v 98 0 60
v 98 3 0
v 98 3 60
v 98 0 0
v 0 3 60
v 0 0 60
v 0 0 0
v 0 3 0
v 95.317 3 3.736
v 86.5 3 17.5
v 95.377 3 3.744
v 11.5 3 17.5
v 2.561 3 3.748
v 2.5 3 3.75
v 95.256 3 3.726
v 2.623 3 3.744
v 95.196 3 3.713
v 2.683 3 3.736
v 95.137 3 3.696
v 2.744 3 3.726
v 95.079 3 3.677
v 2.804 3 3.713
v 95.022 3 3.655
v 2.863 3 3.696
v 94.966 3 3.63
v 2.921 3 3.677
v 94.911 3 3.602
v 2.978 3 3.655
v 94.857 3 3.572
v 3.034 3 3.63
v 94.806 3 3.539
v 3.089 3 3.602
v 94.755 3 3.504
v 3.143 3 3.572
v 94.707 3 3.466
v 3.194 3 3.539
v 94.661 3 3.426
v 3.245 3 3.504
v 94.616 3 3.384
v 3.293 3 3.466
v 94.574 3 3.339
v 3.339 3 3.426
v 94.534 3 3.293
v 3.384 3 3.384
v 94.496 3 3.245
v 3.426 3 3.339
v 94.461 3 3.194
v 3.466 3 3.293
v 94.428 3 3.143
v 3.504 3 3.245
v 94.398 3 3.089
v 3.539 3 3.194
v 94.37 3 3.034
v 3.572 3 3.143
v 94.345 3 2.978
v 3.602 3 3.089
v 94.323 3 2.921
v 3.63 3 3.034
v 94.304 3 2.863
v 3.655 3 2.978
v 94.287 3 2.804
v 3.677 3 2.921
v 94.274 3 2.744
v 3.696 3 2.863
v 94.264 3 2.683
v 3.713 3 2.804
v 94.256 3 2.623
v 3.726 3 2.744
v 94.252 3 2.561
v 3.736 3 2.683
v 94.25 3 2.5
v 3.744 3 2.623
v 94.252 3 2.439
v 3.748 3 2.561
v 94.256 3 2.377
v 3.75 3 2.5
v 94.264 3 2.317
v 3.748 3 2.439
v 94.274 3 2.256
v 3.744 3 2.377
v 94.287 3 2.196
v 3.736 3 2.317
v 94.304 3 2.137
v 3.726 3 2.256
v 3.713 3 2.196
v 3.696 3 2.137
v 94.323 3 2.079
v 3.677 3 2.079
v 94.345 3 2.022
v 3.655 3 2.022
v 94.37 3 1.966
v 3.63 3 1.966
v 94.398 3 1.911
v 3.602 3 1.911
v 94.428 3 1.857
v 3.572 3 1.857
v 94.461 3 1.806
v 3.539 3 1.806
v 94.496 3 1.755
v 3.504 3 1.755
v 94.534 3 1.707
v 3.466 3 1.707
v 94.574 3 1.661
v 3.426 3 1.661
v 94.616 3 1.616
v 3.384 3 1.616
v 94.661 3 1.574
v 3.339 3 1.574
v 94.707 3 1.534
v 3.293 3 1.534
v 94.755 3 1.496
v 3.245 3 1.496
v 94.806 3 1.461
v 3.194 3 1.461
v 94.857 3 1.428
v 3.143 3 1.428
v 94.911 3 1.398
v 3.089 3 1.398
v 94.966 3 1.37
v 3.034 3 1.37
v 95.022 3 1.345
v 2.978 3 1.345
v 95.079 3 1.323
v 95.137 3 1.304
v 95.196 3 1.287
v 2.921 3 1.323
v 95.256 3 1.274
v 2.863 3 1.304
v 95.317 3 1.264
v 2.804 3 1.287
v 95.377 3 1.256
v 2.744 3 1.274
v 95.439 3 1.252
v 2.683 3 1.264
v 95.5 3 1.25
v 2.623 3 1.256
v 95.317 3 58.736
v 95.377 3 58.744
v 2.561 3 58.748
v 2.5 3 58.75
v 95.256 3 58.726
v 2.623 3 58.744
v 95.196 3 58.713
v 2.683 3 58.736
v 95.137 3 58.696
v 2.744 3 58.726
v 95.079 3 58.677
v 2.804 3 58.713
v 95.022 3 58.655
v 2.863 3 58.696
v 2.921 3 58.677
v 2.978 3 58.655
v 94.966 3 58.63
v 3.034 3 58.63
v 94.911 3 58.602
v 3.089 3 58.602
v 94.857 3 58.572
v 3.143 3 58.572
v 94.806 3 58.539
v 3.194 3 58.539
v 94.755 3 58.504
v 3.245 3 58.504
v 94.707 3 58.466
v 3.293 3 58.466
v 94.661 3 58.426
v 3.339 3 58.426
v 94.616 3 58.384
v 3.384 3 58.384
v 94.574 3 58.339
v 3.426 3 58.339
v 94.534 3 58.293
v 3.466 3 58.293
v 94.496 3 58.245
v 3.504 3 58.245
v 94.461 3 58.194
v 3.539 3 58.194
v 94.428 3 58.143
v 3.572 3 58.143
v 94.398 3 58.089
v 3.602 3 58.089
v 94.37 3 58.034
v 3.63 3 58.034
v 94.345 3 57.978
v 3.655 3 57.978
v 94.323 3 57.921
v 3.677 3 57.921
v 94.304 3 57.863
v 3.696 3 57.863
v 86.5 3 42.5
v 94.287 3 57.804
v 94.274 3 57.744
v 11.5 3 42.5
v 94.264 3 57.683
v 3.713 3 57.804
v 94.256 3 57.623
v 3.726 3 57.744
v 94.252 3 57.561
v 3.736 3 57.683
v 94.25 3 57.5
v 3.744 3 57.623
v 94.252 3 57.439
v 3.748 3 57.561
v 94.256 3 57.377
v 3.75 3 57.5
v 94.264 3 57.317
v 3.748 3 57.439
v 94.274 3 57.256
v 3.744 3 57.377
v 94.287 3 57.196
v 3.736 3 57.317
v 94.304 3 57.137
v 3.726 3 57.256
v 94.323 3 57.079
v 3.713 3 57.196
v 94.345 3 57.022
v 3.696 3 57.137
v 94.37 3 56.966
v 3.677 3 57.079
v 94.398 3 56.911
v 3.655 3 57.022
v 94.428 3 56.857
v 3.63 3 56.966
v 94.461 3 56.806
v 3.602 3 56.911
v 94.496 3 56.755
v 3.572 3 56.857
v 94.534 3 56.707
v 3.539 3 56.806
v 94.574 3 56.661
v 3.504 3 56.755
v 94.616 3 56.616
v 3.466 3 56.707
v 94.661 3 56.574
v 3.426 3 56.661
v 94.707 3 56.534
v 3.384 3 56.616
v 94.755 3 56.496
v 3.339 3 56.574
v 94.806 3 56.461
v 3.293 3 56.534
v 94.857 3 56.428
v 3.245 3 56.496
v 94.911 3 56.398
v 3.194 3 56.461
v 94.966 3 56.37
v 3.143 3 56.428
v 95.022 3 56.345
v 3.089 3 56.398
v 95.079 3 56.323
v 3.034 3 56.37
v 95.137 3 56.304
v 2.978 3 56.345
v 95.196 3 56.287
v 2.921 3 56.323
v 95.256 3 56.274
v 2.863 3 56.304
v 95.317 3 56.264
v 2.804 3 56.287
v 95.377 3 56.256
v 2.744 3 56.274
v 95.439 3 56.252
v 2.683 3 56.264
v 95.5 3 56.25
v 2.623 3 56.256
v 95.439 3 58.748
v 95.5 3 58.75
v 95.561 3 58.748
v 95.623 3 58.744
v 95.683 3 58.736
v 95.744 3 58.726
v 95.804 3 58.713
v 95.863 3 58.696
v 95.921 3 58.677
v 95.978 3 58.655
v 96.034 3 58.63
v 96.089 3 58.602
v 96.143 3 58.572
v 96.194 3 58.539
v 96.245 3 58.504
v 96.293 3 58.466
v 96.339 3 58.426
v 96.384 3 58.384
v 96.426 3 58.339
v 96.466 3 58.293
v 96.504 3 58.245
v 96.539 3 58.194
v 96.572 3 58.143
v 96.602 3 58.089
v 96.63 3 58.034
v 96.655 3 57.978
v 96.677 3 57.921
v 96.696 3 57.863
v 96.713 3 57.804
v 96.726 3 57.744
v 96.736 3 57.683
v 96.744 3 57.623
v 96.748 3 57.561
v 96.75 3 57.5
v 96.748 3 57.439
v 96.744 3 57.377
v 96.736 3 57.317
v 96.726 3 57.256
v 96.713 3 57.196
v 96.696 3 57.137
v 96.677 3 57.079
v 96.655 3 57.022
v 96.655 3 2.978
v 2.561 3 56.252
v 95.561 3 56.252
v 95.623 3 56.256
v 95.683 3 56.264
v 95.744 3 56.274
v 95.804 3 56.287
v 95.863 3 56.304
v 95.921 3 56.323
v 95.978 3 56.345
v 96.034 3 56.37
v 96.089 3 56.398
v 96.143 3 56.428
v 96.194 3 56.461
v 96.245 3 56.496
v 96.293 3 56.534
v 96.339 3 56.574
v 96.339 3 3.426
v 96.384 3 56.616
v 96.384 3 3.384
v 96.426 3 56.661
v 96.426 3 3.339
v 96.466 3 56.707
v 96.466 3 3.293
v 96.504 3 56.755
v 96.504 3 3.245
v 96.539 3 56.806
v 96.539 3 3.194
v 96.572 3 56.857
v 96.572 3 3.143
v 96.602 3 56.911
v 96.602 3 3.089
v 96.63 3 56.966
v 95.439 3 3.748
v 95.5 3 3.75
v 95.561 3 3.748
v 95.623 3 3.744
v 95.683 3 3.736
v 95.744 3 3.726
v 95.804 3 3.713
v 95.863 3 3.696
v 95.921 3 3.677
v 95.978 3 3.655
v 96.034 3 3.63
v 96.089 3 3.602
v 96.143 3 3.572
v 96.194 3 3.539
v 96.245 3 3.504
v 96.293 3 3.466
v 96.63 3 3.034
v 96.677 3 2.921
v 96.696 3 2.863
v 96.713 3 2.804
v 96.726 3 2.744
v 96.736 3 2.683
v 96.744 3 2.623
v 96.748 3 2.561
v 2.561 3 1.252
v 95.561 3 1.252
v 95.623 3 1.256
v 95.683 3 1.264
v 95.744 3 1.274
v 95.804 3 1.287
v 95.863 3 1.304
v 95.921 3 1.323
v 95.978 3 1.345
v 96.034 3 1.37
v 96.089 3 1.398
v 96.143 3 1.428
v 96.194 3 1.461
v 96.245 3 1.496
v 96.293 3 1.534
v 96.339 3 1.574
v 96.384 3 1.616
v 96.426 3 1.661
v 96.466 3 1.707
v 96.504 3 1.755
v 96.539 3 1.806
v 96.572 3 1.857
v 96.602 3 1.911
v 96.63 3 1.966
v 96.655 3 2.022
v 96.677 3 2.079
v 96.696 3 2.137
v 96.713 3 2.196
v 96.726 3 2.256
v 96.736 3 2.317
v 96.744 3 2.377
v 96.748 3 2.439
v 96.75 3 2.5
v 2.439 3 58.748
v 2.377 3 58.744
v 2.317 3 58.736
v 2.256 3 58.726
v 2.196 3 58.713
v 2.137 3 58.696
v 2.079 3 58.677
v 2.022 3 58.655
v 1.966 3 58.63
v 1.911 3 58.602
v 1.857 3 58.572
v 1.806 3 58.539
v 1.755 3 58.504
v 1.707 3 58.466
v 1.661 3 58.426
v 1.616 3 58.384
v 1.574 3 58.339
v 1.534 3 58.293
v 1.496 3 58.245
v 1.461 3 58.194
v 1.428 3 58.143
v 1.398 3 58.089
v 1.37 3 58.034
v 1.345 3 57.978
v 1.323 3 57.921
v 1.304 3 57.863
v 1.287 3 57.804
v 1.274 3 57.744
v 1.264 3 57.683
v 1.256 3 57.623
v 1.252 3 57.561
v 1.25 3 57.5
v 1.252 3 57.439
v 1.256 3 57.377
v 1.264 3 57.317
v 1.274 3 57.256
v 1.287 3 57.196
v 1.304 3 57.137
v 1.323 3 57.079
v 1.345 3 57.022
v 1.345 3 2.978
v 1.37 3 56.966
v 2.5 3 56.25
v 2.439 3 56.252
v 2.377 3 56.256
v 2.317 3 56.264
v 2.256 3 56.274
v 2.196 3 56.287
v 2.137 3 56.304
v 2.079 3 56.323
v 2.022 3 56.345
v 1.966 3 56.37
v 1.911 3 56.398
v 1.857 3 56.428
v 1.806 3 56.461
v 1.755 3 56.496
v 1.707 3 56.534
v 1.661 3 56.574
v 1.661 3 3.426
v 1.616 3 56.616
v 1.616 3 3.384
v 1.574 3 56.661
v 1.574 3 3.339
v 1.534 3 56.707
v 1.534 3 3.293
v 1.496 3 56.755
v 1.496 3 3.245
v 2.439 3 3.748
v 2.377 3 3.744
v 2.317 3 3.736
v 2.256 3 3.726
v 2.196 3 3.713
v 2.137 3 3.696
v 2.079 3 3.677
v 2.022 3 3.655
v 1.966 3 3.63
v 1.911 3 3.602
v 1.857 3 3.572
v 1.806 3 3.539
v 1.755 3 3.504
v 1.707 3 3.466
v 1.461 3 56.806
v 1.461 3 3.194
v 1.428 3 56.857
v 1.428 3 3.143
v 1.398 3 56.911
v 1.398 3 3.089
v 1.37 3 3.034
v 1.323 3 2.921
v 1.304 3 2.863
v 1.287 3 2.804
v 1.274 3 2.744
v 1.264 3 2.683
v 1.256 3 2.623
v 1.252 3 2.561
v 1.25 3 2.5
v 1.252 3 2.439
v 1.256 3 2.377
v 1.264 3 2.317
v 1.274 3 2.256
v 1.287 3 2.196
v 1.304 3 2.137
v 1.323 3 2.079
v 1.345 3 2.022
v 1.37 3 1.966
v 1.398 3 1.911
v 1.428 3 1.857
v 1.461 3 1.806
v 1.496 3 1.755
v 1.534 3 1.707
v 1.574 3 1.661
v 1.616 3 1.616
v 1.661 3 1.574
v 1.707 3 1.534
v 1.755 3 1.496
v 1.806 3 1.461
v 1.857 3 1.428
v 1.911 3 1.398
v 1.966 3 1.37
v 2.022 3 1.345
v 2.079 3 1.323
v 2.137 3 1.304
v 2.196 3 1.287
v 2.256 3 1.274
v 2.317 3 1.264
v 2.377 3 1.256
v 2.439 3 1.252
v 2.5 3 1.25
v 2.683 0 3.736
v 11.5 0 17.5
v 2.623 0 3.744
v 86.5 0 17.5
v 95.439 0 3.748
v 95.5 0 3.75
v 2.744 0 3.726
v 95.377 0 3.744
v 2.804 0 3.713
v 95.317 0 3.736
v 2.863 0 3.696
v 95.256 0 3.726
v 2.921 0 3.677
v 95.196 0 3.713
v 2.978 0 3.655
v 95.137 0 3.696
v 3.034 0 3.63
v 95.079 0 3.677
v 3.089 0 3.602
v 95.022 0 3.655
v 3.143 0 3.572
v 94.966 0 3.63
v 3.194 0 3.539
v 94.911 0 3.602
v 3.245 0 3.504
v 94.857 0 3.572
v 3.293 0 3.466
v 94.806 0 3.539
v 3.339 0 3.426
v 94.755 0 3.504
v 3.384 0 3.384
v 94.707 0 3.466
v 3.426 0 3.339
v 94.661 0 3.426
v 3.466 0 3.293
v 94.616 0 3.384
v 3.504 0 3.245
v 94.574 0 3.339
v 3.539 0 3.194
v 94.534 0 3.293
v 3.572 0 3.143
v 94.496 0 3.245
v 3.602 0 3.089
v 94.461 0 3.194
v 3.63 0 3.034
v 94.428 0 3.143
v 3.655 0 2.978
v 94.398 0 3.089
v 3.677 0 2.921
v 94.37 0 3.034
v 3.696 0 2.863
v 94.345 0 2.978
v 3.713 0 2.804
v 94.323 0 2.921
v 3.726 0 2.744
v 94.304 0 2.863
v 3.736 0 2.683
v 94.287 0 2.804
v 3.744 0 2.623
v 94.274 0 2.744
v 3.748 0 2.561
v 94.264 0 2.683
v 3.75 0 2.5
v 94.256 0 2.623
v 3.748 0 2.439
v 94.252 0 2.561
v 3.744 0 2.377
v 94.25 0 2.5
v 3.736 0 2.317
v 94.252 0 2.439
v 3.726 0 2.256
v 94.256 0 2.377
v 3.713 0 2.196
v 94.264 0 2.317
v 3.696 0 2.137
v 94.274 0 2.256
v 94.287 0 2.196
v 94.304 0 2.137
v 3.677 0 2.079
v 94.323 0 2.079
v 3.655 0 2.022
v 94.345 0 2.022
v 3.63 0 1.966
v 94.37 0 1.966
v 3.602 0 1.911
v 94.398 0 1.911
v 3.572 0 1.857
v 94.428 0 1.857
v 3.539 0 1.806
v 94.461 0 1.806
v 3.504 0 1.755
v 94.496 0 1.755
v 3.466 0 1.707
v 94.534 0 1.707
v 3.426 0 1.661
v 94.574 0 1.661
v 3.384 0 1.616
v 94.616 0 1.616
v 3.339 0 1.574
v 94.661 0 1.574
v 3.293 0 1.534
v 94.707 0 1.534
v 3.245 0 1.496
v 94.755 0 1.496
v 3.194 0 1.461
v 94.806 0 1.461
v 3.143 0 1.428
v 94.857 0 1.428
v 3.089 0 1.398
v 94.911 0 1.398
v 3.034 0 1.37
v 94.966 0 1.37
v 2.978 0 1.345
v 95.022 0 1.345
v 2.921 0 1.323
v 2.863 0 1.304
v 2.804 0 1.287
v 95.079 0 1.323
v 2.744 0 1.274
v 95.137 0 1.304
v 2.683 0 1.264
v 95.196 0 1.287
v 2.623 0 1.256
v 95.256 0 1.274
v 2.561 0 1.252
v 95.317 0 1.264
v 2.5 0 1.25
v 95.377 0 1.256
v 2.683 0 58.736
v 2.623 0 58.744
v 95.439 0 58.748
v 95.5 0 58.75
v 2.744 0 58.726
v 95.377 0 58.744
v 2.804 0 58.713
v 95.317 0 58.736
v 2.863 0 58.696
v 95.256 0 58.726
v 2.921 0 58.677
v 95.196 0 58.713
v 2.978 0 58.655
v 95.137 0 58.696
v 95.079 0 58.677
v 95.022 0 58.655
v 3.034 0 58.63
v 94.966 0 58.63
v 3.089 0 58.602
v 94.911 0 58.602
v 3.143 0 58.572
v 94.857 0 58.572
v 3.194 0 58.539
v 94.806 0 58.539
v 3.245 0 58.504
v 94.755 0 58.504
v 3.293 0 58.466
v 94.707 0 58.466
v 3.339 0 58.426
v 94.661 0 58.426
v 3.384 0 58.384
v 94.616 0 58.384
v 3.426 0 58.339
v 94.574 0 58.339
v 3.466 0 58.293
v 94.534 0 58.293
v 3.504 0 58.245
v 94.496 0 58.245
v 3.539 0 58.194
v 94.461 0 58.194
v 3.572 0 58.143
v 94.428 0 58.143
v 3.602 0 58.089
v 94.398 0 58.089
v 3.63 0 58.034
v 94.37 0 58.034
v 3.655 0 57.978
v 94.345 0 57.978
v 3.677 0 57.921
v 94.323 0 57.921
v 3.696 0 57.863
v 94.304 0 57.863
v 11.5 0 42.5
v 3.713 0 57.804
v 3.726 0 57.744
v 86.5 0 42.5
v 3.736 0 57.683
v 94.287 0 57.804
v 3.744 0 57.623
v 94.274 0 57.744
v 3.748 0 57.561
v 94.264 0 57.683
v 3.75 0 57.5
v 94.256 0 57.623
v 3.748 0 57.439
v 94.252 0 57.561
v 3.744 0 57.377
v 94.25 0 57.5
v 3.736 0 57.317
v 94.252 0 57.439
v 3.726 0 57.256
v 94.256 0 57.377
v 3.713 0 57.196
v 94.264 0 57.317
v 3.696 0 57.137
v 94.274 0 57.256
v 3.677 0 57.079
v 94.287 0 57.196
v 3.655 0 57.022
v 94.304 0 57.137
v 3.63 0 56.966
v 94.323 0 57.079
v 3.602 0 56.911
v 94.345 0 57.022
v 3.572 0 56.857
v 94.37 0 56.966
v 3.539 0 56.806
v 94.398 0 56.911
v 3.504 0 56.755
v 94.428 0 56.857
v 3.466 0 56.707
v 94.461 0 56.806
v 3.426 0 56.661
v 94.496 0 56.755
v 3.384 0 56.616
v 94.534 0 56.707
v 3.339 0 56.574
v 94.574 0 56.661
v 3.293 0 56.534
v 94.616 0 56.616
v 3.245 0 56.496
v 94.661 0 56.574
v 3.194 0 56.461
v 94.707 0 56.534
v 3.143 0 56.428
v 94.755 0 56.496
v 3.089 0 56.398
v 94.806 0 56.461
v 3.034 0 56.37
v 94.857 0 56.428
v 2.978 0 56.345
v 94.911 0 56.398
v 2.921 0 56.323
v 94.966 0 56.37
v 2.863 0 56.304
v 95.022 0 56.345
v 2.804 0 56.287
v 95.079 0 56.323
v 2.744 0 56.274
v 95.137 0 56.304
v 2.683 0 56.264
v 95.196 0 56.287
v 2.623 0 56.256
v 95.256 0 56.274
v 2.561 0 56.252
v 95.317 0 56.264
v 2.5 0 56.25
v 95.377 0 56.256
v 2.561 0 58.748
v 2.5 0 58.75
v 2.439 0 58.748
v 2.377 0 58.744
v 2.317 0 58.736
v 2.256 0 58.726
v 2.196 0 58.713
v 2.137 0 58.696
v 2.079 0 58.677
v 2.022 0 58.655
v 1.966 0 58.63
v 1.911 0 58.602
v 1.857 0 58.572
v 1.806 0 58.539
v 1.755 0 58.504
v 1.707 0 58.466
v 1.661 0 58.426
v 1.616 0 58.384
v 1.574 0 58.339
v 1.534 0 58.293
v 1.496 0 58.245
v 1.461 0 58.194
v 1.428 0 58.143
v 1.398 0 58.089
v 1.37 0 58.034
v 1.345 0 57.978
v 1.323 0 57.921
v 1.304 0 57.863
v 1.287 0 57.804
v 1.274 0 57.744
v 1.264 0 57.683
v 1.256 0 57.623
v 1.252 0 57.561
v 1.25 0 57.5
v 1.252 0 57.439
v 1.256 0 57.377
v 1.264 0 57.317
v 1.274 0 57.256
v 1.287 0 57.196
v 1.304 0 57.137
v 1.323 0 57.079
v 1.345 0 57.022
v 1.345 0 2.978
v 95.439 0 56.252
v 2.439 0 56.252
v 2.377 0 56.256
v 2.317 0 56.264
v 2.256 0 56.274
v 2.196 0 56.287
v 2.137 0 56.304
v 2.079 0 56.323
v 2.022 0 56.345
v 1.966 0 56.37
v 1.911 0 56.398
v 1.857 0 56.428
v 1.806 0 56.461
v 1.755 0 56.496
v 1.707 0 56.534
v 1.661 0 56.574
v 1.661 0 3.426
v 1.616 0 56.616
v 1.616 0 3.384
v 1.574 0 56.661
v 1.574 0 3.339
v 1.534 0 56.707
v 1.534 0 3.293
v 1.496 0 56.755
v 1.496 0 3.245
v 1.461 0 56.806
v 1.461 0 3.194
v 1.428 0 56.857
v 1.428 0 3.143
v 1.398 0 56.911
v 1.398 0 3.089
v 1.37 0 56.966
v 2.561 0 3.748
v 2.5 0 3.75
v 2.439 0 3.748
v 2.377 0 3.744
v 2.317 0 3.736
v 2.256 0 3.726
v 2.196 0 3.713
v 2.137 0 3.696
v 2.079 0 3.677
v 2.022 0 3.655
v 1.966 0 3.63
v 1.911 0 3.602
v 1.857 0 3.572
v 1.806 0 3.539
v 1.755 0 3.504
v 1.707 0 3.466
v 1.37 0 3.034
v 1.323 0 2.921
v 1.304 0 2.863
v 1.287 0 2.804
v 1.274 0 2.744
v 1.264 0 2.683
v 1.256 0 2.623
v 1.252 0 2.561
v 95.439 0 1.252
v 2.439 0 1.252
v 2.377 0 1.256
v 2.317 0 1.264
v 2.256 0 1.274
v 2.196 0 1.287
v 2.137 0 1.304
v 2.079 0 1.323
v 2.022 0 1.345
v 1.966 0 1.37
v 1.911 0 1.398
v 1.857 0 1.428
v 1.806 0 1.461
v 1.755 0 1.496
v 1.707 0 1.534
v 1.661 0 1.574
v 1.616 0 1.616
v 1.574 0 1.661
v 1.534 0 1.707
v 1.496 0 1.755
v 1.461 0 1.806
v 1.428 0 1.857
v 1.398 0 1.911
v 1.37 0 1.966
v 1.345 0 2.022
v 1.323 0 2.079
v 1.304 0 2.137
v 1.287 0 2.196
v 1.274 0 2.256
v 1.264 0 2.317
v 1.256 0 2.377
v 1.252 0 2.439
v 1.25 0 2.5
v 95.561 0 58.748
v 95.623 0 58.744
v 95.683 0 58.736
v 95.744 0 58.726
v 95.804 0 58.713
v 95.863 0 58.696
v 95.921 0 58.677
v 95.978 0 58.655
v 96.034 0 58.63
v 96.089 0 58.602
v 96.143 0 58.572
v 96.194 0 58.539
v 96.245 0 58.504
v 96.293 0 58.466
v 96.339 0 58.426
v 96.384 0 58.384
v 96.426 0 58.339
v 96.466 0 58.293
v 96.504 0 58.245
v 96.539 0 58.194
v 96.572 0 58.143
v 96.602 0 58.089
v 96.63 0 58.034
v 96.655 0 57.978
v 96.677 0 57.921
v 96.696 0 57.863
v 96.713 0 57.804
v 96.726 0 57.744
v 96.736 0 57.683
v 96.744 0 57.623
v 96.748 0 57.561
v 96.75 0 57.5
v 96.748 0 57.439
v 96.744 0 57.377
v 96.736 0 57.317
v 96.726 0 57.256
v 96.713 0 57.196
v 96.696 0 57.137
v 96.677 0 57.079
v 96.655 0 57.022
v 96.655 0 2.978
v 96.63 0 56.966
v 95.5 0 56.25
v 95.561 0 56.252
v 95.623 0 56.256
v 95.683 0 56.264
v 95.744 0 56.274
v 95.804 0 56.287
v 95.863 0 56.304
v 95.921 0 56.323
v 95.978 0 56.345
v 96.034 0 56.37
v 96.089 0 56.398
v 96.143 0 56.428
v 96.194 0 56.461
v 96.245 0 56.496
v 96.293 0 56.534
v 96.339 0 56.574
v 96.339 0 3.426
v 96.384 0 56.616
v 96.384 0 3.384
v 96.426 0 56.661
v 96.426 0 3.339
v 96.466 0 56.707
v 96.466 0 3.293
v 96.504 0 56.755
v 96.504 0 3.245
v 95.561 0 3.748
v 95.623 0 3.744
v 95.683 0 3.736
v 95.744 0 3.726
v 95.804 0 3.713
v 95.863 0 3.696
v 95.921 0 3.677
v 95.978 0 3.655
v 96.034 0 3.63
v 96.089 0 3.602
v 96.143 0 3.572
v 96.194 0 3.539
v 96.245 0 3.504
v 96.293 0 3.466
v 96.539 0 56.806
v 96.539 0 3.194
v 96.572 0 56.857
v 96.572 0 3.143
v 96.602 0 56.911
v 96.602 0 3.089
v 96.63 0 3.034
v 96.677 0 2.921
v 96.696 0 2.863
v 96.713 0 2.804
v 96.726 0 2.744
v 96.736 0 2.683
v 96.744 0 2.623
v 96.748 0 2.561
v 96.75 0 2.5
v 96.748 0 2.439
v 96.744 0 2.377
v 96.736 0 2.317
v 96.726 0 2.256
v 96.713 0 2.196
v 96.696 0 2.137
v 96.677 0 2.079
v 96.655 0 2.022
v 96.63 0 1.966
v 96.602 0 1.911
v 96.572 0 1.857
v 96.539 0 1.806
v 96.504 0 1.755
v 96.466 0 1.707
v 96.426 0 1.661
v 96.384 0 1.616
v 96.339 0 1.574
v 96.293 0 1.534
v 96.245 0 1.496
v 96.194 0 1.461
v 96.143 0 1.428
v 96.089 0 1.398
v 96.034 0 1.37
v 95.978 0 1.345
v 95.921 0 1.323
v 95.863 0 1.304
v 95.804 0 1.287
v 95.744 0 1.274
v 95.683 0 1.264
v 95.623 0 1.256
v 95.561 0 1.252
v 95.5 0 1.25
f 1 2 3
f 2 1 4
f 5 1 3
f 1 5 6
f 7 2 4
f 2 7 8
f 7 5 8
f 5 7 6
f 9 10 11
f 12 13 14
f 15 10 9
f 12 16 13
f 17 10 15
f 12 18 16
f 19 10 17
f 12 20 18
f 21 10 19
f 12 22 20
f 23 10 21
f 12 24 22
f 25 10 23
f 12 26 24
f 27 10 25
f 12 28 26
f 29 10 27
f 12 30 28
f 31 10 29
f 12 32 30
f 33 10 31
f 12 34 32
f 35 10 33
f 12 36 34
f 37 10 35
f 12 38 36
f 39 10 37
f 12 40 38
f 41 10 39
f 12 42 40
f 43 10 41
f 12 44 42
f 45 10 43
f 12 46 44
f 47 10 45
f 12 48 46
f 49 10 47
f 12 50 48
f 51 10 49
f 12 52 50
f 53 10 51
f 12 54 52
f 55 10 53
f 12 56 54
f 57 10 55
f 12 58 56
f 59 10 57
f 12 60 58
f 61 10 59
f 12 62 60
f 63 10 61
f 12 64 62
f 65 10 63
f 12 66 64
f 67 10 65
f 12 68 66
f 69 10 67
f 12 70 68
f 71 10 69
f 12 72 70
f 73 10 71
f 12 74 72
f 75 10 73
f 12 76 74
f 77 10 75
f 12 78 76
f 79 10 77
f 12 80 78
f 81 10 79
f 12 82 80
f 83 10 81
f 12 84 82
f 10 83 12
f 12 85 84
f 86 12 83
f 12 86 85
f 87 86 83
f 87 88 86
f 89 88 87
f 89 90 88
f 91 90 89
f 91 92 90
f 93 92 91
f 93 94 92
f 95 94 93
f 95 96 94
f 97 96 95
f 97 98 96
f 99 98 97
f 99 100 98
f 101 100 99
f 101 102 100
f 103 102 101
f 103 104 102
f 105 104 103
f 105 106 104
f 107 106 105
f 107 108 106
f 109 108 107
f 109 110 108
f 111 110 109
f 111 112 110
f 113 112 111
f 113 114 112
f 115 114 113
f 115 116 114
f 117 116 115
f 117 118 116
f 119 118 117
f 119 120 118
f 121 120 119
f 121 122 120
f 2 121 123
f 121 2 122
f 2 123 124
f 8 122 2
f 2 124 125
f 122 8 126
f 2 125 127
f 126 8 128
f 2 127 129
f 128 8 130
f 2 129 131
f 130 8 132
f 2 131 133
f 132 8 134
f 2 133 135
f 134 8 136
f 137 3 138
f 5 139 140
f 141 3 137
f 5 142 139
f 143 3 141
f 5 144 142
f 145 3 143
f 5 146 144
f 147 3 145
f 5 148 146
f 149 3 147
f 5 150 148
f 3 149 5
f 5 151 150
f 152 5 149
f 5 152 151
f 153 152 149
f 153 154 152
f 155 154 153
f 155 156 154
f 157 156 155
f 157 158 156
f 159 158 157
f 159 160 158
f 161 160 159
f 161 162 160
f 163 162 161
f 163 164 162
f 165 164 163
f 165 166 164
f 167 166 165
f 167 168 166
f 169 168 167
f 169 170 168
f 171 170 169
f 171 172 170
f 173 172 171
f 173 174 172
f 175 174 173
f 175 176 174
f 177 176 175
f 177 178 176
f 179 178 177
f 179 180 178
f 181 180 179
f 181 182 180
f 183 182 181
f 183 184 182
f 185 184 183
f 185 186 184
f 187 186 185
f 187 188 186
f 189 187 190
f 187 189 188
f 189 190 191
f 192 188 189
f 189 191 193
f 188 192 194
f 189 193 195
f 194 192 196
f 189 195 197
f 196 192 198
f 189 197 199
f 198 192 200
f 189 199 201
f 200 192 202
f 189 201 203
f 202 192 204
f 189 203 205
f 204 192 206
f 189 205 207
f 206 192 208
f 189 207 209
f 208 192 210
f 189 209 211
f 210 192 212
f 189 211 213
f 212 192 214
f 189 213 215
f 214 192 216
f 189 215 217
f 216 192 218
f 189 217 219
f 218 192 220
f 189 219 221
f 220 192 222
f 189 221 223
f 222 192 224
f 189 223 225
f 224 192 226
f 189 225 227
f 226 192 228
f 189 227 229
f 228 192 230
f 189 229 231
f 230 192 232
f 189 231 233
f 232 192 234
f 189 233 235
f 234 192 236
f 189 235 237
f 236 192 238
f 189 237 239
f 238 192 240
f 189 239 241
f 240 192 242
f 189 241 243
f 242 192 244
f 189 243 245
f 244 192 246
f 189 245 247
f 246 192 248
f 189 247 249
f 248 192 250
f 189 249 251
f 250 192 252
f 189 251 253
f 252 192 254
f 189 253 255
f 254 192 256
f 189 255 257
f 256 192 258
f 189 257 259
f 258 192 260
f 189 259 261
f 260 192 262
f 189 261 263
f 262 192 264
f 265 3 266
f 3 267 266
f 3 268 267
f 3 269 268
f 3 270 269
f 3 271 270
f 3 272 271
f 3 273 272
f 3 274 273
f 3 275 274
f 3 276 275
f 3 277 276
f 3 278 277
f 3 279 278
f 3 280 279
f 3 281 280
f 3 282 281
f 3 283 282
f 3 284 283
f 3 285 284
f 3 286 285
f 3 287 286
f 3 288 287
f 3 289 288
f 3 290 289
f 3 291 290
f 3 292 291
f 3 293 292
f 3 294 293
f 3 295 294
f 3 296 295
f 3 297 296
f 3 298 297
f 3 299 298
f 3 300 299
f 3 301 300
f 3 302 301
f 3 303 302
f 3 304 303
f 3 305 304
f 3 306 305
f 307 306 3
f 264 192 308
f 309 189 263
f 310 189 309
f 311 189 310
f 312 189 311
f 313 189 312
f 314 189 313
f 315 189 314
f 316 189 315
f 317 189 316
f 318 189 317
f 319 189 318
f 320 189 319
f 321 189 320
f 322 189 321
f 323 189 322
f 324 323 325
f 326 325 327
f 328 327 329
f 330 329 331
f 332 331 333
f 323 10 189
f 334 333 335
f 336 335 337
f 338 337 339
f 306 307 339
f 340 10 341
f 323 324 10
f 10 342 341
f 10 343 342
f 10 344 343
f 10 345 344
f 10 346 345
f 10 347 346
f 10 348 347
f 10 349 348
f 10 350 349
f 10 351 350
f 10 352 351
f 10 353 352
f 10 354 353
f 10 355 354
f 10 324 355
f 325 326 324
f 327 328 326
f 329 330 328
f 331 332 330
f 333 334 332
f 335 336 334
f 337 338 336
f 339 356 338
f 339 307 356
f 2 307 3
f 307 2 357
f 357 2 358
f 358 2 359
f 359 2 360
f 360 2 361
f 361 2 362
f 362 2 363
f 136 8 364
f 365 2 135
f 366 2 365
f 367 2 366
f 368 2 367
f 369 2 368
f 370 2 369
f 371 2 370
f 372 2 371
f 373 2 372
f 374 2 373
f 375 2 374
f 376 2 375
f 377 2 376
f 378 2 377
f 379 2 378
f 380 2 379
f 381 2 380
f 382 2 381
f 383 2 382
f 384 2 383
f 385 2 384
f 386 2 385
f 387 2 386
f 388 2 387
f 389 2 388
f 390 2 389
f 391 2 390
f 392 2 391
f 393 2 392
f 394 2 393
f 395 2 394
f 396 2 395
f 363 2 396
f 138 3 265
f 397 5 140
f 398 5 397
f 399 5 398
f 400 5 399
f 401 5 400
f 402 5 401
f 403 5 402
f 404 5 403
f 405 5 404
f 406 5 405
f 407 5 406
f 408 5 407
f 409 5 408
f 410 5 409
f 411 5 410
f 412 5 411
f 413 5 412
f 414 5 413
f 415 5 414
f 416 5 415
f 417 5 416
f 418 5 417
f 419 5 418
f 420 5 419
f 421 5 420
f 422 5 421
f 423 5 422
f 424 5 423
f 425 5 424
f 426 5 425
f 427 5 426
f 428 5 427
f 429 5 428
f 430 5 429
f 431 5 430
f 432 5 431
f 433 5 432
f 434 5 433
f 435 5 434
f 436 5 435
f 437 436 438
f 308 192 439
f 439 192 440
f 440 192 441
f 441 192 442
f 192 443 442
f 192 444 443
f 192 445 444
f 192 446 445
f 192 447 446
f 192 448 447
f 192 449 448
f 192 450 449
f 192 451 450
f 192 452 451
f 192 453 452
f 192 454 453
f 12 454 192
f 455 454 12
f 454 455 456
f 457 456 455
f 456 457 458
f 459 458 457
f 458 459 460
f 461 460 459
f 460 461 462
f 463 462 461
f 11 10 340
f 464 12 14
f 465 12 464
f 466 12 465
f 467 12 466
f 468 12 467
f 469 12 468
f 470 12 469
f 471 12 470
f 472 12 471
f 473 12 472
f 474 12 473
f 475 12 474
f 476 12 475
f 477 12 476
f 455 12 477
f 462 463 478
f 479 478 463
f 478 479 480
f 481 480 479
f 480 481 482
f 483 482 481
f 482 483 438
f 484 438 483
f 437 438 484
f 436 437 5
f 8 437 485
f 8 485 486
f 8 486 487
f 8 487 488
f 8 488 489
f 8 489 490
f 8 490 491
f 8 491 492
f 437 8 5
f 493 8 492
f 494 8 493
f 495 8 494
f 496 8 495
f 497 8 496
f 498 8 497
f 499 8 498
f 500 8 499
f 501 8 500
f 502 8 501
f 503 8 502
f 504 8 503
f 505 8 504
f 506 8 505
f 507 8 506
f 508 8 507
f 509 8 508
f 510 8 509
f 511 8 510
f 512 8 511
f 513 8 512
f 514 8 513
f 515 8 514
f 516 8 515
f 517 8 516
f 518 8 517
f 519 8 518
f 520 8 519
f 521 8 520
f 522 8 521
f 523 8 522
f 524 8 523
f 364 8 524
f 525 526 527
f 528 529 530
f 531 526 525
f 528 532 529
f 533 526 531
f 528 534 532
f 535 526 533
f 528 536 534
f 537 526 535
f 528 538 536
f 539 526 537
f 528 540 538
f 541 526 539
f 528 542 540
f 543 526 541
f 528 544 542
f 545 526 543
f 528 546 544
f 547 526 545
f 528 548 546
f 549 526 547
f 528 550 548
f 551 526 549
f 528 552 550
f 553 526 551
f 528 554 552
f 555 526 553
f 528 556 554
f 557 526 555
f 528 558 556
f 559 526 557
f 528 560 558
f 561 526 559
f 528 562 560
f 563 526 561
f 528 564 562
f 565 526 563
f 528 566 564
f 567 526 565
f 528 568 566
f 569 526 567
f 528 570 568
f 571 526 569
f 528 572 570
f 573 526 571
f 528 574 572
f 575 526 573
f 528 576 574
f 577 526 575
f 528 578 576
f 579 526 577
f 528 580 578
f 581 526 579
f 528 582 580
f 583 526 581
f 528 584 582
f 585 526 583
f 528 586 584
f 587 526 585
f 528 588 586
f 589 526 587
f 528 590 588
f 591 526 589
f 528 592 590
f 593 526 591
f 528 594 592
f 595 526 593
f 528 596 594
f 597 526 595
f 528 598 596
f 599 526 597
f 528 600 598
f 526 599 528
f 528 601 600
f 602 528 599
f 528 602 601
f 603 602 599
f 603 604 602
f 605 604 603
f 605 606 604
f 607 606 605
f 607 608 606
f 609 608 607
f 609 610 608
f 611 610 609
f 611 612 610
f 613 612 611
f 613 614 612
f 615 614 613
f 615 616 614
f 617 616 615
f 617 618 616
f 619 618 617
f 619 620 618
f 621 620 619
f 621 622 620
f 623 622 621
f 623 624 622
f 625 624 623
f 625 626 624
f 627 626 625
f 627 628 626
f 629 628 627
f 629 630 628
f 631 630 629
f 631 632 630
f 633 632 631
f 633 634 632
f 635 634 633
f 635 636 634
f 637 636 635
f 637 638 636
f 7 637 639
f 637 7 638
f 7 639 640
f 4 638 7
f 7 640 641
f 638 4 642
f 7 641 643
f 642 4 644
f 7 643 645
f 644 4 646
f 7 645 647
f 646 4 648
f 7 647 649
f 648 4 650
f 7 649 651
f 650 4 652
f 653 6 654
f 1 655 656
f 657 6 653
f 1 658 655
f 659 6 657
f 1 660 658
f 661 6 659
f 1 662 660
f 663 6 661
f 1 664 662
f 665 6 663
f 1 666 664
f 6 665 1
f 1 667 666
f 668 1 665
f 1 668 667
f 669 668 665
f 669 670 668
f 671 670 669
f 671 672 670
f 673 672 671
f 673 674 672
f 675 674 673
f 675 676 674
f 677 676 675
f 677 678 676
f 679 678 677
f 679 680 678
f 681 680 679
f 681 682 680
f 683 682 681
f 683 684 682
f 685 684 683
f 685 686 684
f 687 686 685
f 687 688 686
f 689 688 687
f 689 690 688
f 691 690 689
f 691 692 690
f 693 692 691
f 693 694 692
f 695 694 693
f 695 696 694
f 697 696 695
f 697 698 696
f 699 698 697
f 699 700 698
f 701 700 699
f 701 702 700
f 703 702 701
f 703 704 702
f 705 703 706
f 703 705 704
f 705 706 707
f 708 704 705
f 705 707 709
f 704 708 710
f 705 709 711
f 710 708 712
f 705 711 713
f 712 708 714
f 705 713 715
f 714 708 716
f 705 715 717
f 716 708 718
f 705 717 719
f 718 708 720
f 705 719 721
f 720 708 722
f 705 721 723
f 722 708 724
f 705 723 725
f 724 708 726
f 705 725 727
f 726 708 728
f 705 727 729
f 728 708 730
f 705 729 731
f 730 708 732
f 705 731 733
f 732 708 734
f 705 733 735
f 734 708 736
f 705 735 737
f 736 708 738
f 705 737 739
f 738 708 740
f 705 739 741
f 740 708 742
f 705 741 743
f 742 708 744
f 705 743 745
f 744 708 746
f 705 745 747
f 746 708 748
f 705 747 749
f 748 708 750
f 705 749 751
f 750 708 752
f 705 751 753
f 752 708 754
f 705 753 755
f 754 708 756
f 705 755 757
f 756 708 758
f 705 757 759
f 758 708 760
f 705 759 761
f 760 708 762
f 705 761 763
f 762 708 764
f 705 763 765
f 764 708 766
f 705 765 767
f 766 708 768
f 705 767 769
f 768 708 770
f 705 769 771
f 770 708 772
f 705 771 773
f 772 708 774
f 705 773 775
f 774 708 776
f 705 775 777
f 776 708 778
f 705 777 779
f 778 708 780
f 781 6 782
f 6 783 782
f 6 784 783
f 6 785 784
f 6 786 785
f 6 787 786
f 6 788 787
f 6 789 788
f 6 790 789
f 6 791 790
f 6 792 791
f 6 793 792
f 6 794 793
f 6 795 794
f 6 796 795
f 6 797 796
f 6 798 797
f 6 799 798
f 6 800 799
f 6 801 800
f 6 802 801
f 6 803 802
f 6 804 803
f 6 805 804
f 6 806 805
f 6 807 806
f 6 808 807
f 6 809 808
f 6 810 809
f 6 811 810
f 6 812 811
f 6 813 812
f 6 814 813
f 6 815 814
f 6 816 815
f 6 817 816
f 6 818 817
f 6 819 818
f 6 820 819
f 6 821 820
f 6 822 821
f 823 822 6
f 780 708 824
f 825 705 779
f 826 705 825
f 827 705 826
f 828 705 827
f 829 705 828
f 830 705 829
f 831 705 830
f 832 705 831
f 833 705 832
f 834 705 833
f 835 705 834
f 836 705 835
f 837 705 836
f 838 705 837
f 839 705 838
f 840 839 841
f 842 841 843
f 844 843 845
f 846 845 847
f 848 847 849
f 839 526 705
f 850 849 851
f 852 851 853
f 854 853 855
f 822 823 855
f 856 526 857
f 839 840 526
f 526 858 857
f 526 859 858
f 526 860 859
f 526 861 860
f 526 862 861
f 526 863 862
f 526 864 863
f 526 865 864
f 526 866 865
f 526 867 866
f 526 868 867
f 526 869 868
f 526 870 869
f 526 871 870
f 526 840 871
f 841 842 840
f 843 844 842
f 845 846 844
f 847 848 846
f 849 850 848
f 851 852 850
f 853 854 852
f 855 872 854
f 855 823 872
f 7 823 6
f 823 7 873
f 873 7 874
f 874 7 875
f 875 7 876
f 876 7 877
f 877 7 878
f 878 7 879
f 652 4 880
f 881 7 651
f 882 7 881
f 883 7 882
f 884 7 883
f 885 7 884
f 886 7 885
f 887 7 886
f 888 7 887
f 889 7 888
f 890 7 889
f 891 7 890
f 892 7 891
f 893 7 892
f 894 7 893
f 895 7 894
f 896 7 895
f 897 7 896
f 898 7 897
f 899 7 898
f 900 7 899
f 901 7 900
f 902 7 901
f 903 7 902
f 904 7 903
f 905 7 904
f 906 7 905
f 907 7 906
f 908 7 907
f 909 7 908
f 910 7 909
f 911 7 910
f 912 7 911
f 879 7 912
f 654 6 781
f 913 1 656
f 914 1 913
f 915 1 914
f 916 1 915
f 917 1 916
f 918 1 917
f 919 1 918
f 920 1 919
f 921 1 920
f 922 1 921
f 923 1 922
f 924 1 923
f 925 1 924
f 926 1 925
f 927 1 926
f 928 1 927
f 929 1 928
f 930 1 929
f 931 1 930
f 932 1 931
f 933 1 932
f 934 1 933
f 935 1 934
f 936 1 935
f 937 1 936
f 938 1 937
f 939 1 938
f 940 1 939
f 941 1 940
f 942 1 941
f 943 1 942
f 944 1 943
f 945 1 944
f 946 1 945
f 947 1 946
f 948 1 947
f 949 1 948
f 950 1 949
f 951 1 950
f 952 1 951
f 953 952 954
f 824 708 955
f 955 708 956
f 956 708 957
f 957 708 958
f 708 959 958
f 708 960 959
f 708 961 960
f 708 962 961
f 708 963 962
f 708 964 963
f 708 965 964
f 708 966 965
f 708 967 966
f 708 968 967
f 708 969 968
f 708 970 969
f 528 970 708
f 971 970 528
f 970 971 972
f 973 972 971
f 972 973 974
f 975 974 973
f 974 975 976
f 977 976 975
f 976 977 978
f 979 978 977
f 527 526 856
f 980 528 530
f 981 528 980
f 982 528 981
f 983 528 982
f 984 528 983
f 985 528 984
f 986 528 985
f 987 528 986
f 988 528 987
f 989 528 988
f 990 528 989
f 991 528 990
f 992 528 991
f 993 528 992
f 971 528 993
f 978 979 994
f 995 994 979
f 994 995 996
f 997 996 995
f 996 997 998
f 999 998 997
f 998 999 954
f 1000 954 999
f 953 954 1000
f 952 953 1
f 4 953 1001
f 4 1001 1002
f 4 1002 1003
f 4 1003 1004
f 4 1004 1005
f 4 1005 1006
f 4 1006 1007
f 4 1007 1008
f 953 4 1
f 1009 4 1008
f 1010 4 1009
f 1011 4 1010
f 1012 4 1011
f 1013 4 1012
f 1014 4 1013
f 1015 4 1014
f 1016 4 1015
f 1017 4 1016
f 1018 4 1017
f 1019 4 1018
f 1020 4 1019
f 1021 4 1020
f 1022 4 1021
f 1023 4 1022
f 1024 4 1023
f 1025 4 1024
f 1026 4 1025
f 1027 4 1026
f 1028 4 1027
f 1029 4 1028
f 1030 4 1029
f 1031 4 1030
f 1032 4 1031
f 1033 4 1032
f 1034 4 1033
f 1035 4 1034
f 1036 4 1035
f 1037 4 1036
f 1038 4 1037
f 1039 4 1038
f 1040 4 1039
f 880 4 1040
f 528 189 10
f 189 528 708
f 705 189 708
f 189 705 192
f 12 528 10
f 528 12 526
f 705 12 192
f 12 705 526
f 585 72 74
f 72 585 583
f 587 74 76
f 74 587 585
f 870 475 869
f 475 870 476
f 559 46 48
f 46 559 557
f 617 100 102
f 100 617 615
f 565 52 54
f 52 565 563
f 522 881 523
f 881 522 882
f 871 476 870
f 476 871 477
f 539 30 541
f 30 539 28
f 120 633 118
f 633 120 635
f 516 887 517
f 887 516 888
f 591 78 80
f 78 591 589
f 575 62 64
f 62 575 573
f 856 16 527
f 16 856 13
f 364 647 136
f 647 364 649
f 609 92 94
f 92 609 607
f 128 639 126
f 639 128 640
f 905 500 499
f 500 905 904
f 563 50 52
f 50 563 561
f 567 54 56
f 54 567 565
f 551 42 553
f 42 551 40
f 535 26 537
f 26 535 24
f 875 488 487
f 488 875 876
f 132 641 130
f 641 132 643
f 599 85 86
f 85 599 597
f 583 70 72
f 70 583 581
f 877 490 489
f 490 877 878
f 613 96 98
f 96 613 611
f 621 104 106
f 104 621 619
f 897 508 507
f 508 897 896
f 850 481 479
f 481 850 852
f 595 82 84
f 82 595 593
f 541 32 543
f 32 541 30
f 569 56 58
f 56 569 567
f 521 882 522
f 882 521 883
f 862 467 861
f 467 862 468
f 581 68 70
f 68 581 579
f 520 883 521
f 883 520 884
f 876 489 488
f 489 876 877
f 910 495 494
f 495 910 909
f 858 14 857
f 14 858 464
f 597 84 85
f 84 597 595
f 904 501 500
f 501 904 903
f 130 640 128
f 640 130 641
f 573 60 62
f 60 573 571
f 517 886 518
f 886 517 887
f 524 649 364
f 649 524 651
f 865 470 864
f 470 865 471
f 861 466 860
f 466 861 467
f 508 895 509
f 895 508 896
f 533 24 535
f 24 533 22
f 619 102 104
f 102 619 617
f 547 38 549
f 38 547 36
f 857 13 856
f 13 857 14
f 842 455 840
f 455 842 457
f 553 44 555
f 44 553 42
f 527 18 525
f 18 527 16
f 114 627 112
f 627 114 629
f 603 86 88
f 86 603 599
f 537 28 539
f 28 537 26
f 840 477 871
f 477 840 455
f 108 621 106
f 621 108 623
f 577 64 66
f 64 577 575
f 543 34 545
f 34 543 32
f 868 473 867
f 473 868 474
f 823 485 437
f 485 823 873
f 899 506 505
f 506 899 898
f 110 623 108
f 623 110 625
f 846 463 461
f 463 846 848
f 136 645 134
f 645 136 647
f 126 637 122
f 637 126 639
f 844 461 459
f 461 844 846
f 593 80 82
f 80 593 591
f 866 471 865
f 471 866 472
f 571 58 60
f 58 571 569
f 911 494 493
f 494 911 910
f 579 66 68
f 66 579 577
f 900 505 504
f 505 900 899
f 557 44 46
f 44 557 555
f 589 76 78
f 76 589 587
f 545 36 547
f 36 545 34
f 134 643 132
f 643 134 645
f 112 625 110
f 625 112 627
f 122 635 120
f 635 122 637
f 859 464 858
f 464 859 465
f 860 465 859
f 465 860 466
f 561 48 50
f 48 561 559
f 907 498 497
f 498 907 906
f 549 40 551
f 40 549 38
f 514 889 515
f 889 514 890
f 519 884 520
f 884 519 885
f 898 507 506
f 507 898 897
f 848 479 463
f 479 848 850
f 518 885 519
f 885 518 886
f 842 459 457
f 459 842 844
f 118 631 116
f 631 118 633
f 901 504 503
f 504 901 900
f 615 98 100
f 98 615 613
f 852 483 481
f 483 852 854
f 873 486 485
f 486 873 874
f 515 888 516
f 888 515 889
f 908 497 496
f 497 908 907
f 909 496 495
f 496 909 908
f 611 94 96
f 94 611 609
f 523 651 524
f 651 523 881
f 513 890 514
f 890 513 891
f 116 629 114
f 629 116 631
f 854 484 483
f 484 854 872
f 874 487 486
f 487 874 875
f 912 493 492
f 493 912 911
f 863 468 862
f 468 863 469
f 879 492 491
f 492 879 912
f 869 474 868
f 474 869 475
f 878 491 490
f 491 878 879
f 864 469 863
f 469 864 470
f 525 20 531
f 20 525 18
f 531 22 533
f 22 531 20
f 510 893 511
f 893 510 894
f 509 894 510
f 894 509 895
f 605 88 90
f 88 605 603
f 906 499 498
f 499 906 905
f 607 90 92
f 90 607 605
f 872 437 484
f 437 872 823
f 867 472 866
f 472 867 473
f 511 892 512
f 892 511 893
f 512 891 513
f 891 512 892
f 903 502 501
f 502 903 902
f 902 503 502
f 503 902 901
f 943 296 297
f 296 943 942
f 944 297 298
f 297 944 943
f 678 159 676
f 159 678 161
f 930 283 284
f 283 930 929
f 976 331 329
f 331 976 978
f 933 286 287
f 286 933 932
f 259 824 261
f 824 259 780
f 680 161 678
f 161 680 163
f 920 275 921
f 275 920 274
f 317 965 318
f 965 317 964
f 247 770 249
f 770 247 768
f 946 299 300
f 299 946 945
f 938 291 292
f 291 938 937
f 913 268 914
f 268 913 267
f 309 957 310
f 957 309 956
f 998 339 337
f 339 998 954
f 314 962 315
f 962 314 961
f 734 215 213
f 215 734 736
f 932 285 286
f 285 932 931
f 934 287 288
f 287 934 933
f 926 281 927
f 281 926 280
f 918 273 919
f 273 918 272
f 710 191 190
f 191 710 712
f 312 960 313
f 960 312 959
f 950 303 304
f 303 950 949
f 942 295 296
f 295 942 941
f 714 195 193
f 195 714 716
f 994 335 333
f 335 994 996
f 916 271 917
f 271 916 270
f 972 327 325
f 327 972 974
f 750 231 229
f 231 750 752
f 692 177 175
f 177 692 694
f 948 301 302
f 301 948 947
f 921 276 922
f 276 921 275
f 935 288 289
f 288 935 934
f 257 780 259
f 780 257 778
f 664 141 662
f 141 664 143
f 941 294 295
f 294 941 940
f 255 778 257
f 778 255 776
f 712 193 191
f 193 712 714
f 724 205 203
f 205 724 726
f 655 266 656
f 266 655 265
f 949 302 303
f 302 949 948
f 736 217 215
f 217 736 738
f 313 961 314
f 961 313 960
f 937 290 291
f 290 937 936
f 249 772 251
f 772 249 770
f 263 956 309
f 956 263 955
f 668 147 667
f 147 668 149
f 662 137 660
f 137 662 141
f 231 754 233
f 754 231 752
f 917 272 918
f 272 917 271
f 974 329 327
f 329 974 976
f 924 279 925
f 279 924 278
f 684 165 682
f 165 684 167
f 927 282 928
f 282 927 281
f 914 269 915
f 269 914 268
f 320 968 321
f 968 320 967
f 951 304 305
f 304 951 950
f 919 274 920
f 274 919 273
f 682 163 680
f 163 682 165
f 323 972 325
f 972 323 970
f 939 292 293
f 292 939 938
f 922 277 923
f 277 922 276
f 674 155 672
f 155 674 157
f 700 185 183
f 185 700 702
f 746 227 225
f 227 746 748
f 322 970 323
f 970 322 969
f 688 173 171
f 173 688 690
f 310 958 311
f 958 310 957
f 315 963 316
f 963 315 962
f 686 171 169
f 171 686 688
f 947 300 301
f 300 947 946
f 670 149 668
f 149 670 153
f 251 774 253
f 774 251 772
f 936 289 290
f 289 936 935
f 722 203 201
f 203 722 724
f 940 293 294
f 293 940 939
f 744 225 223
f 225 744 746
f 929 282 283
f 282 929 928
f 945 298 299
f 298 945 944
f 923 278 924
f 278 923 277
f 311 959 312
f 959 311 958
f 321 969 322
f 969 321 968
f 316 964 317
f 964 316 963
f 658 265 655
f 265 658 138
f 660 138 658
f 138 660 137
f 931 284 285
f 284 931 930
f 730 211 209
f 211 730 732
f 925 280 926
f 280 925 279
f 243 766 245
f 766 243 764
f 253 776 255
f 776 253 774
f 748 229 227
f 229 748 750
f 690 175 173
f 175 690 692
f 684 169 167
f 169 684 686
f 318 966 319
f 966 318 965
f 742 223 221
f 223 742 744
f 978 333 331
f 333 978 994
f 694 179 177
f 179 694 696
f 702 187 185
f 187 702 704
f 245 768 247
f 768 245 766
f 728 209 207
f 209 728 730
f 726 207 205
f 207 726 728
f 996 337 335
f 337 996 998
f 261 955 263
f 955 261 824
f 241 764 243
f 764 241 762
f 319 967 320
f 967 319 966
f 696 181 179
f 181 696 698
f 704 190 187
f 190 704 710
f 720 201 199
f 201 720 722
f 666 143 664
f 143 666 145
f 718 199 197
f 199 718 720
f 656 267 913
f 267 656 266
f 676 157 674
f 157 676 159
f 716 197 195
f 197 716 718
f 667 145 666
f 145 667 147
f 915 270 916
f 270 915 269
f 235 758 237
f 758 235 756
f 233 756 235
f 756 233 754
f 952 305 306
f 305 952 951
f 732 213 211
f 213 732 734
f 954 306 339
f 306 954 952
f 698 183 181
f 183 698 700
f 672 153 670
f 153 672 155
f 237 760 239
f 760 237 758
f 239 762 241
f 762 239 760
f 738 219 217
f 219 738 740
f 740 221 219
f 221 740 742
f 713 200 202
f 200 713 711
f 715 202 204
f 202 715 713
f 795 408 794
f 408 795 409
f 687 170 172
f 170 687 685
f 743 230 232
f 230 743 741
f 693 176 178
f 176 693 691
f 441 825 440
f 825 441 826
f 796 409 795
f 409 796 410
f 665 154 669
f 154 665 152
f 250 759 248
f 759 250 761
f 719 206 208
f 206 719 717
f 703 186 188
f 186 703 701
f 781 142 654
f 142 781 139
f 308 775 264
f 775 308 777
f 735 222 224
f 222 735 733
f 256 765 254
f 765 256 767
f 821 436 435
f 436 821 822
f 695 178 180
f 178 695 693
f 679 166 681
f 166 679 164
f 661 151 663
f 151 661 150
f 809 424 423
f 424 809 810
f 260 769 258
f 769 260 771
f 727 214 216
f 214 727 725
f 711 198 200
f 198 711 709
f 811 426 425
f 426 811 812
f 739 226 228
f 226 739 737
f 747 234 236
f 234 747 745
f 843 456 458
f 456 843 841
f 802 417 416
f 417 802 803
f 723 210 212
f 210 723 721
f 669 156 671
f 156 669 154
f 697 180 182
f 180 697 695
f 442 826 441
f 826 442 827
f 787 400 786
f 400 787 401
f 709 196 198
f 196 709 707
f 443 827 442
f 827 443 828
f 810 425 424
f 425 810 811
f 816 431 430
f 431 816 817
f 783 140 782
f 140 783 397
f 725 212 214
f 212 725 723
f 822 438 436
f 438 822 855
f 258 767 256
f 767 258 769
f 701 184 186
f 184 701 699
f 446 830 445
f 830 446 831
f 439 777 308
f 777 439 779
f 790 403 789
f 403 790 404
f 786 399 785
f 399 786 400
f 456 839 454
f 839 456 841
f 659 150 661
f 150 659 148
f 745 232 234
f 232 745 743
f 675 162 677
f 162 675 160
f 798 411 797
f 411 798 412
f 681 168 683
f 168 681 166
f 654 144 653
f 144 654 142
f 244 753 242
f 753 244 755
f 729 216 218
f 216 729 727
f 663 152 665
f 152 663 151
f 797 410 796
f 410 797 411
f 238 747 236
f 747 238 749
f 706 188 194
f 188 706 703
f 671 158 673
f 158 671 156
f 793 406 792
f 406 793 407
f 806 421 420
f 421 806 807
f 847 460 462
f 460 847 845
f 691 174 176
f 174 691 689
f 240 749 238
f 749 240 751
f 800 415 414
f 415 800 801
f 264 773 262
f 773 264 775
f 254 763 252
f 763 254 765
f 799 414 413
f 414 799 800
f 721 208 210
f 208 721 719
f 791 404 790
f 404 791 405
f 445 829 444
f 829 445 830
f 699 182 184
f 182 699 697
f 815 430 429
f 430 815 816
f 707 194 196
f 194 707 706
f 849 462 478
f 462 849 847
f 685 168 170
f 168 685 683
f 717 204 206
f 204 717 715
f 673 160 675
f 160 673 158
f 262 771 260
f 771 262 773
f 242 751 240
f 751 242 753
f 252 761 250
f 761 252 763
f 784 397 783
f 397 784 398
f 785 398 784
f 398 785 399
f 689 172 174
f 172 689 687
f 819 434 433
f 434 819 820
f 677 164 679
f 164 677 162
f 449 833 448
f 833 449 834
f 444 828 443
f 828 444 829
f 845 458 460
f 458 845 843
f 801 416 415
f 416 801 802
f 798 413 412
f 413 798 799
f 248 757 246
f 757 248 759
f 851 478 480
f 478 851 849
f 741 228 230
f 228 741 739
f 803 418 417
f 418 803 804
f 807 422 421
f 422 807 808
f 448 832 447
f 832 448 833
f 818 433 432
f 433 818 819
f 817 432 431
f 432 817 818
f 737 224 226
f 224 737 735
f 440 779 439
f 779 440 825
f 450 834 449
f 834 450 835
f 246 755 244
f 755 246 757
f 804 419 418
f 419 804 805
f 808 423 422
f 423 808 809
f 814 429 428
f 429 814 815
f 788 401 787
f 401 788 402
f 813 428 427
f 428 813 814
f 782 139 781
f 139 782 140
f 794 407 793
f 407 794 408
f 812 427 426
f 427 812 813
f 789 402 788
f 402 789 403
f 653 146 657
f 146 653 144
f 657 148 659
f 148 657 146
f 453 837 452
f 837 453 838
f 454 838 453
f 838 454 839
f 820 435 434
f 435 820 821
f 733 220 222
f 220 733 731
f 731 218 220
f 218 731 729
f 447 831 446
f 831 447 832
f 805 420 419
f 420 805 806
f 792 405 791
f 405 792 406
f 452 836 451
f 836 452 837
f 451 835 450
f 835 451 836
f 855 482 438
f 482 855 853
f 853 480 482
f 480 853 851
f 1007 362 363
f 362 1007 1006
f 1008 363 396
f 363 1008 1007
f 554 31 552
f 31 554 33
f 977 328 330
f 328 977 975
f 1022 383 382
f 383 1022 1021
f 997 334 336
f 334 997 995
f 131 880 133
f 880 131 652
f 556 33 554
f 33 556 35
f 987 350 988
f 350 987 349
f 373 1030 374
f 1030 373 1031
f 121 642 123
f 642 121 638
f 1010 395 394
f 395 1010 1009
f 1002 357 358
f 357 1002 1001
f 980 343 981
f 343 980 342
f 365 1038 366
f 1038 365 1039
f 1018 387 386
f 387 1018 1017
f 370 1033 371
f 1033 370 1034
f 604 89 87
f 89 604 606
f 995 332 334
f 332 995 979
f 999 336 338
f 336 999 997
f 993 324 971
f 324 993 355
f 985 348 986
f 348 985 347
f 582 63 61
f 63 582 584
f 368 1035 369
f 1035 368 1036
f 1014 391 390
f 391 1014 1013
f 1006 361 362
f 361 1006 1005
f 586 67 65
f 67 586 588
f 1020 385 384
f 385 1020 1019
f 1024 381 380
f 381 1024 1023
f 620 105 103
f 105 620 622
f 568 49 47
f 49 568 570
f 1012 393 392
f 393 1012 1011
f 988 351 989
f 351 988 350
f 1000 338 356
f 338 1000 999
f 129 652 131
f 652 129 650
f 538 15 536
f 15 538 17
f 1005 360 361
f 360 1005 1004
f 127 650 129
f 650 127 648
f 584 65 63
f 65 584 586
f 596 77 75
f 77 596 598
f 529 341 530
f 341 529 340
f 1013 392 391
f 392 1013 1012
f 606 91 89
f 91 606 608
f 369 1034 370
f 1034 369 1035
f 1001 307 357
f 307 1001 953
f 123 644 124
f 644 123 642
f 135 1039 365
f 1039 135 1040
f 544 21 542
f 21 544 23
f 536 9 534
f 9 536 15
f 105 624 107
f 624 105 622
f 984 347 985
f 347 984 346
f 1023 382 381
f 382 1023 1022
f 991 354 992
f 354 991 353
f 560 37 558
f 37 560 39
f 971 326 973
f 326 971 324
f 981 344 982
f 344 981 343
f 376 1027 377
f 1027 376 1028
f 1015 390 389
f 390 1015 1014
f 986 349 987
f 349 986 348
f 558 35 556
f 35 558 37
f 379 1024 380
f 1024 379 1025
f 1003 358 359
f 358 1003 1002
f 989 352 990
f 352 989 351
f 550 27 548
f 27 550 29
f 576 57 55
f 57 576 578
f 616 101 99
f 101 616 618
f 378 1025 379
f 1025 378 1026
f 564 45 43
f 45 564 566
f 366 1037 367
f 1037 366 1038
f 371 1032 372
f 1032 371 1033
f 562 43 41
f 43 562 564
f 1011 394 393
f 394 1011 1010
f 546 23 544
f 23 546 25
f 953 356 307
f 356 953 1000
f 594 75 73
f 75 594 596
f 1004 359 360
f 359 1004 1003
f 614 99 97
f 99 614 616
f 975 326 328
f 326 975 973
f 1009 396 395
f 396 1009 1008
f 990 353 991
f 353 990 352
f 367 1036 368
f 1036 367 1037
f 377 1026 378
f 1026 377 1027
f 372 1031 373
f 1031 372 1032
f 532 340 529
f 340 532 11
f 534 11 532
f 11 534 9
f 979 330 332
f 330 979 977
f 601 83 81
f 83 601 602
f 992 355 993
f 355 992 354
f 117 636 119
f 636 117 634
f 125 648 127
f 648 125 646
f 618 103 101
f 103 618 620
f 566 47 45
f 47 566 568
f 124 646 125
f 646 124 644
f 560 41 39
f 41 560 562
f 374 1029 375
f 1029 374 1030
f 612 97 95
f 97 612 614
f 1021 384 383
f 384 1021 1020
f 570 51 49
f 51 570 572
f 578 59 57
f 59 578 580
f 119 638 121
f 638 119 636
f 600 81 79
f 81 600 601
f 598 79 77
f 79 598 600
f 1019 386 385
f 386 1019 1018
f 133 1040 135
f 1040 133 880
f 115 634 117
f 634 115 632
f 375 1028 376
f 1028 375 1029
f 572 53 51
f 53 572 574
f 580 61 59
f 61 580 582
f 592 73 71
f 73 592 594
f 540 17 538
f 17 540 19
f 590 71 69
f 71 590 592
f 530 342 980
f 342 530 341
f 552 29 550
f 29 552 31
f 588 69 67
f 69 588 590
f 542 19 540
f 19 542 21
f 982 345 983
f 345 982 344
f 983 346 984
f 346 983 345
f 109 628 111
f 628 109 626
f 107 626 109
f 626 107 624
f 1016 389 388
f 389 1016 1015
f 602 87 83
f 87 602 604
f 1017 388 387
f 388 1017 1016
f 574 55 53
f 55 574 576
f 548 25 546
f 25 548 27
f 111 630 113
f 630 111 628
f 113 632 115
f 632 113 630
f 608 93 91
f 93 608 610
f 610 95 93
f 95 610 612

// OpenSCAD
width = 98;
height = 60;
depth = 3;
$fn = 128;
hole_size = 2.5/2;
hole_offset = 2.5;

difference() {
  cube( [ width, depth, height ] );
    
    translate( [ (width-75)/2, -1, (height-25)/2 ] ) { 
        cube( [ 75, 5, 25] );
    }
   
    // Subwoofer
    translate( [ hole_offset, 4, hole_offset ] ) { 
        rotate( [ 90, 0, 0] ) {
            cylinder( 4, hole_size, hole_size );
        }
    }  
    
    translate( [ width - hole_offset, 4, height - hole_offset ] ) { 
        rotate( [ 90, 0, 0] ) {
            cylinder( 4, hole_size, hole_size );
        }
    }  
        
    translate( [ hole_offset, 4, height - hole_offset ] ) { 
        rotate( [ 90, 0, 0] ) {
            cylinder( 4, hole_size, hole_size );
        }
    }  
    
    translate( [ width - hole_offset, 4, hole_offset ] ) { 
        rotate( [ 90, 0, 0] ) {
            cylinder( 4, hole_size, hole_size );
        }
    }  
 
}
